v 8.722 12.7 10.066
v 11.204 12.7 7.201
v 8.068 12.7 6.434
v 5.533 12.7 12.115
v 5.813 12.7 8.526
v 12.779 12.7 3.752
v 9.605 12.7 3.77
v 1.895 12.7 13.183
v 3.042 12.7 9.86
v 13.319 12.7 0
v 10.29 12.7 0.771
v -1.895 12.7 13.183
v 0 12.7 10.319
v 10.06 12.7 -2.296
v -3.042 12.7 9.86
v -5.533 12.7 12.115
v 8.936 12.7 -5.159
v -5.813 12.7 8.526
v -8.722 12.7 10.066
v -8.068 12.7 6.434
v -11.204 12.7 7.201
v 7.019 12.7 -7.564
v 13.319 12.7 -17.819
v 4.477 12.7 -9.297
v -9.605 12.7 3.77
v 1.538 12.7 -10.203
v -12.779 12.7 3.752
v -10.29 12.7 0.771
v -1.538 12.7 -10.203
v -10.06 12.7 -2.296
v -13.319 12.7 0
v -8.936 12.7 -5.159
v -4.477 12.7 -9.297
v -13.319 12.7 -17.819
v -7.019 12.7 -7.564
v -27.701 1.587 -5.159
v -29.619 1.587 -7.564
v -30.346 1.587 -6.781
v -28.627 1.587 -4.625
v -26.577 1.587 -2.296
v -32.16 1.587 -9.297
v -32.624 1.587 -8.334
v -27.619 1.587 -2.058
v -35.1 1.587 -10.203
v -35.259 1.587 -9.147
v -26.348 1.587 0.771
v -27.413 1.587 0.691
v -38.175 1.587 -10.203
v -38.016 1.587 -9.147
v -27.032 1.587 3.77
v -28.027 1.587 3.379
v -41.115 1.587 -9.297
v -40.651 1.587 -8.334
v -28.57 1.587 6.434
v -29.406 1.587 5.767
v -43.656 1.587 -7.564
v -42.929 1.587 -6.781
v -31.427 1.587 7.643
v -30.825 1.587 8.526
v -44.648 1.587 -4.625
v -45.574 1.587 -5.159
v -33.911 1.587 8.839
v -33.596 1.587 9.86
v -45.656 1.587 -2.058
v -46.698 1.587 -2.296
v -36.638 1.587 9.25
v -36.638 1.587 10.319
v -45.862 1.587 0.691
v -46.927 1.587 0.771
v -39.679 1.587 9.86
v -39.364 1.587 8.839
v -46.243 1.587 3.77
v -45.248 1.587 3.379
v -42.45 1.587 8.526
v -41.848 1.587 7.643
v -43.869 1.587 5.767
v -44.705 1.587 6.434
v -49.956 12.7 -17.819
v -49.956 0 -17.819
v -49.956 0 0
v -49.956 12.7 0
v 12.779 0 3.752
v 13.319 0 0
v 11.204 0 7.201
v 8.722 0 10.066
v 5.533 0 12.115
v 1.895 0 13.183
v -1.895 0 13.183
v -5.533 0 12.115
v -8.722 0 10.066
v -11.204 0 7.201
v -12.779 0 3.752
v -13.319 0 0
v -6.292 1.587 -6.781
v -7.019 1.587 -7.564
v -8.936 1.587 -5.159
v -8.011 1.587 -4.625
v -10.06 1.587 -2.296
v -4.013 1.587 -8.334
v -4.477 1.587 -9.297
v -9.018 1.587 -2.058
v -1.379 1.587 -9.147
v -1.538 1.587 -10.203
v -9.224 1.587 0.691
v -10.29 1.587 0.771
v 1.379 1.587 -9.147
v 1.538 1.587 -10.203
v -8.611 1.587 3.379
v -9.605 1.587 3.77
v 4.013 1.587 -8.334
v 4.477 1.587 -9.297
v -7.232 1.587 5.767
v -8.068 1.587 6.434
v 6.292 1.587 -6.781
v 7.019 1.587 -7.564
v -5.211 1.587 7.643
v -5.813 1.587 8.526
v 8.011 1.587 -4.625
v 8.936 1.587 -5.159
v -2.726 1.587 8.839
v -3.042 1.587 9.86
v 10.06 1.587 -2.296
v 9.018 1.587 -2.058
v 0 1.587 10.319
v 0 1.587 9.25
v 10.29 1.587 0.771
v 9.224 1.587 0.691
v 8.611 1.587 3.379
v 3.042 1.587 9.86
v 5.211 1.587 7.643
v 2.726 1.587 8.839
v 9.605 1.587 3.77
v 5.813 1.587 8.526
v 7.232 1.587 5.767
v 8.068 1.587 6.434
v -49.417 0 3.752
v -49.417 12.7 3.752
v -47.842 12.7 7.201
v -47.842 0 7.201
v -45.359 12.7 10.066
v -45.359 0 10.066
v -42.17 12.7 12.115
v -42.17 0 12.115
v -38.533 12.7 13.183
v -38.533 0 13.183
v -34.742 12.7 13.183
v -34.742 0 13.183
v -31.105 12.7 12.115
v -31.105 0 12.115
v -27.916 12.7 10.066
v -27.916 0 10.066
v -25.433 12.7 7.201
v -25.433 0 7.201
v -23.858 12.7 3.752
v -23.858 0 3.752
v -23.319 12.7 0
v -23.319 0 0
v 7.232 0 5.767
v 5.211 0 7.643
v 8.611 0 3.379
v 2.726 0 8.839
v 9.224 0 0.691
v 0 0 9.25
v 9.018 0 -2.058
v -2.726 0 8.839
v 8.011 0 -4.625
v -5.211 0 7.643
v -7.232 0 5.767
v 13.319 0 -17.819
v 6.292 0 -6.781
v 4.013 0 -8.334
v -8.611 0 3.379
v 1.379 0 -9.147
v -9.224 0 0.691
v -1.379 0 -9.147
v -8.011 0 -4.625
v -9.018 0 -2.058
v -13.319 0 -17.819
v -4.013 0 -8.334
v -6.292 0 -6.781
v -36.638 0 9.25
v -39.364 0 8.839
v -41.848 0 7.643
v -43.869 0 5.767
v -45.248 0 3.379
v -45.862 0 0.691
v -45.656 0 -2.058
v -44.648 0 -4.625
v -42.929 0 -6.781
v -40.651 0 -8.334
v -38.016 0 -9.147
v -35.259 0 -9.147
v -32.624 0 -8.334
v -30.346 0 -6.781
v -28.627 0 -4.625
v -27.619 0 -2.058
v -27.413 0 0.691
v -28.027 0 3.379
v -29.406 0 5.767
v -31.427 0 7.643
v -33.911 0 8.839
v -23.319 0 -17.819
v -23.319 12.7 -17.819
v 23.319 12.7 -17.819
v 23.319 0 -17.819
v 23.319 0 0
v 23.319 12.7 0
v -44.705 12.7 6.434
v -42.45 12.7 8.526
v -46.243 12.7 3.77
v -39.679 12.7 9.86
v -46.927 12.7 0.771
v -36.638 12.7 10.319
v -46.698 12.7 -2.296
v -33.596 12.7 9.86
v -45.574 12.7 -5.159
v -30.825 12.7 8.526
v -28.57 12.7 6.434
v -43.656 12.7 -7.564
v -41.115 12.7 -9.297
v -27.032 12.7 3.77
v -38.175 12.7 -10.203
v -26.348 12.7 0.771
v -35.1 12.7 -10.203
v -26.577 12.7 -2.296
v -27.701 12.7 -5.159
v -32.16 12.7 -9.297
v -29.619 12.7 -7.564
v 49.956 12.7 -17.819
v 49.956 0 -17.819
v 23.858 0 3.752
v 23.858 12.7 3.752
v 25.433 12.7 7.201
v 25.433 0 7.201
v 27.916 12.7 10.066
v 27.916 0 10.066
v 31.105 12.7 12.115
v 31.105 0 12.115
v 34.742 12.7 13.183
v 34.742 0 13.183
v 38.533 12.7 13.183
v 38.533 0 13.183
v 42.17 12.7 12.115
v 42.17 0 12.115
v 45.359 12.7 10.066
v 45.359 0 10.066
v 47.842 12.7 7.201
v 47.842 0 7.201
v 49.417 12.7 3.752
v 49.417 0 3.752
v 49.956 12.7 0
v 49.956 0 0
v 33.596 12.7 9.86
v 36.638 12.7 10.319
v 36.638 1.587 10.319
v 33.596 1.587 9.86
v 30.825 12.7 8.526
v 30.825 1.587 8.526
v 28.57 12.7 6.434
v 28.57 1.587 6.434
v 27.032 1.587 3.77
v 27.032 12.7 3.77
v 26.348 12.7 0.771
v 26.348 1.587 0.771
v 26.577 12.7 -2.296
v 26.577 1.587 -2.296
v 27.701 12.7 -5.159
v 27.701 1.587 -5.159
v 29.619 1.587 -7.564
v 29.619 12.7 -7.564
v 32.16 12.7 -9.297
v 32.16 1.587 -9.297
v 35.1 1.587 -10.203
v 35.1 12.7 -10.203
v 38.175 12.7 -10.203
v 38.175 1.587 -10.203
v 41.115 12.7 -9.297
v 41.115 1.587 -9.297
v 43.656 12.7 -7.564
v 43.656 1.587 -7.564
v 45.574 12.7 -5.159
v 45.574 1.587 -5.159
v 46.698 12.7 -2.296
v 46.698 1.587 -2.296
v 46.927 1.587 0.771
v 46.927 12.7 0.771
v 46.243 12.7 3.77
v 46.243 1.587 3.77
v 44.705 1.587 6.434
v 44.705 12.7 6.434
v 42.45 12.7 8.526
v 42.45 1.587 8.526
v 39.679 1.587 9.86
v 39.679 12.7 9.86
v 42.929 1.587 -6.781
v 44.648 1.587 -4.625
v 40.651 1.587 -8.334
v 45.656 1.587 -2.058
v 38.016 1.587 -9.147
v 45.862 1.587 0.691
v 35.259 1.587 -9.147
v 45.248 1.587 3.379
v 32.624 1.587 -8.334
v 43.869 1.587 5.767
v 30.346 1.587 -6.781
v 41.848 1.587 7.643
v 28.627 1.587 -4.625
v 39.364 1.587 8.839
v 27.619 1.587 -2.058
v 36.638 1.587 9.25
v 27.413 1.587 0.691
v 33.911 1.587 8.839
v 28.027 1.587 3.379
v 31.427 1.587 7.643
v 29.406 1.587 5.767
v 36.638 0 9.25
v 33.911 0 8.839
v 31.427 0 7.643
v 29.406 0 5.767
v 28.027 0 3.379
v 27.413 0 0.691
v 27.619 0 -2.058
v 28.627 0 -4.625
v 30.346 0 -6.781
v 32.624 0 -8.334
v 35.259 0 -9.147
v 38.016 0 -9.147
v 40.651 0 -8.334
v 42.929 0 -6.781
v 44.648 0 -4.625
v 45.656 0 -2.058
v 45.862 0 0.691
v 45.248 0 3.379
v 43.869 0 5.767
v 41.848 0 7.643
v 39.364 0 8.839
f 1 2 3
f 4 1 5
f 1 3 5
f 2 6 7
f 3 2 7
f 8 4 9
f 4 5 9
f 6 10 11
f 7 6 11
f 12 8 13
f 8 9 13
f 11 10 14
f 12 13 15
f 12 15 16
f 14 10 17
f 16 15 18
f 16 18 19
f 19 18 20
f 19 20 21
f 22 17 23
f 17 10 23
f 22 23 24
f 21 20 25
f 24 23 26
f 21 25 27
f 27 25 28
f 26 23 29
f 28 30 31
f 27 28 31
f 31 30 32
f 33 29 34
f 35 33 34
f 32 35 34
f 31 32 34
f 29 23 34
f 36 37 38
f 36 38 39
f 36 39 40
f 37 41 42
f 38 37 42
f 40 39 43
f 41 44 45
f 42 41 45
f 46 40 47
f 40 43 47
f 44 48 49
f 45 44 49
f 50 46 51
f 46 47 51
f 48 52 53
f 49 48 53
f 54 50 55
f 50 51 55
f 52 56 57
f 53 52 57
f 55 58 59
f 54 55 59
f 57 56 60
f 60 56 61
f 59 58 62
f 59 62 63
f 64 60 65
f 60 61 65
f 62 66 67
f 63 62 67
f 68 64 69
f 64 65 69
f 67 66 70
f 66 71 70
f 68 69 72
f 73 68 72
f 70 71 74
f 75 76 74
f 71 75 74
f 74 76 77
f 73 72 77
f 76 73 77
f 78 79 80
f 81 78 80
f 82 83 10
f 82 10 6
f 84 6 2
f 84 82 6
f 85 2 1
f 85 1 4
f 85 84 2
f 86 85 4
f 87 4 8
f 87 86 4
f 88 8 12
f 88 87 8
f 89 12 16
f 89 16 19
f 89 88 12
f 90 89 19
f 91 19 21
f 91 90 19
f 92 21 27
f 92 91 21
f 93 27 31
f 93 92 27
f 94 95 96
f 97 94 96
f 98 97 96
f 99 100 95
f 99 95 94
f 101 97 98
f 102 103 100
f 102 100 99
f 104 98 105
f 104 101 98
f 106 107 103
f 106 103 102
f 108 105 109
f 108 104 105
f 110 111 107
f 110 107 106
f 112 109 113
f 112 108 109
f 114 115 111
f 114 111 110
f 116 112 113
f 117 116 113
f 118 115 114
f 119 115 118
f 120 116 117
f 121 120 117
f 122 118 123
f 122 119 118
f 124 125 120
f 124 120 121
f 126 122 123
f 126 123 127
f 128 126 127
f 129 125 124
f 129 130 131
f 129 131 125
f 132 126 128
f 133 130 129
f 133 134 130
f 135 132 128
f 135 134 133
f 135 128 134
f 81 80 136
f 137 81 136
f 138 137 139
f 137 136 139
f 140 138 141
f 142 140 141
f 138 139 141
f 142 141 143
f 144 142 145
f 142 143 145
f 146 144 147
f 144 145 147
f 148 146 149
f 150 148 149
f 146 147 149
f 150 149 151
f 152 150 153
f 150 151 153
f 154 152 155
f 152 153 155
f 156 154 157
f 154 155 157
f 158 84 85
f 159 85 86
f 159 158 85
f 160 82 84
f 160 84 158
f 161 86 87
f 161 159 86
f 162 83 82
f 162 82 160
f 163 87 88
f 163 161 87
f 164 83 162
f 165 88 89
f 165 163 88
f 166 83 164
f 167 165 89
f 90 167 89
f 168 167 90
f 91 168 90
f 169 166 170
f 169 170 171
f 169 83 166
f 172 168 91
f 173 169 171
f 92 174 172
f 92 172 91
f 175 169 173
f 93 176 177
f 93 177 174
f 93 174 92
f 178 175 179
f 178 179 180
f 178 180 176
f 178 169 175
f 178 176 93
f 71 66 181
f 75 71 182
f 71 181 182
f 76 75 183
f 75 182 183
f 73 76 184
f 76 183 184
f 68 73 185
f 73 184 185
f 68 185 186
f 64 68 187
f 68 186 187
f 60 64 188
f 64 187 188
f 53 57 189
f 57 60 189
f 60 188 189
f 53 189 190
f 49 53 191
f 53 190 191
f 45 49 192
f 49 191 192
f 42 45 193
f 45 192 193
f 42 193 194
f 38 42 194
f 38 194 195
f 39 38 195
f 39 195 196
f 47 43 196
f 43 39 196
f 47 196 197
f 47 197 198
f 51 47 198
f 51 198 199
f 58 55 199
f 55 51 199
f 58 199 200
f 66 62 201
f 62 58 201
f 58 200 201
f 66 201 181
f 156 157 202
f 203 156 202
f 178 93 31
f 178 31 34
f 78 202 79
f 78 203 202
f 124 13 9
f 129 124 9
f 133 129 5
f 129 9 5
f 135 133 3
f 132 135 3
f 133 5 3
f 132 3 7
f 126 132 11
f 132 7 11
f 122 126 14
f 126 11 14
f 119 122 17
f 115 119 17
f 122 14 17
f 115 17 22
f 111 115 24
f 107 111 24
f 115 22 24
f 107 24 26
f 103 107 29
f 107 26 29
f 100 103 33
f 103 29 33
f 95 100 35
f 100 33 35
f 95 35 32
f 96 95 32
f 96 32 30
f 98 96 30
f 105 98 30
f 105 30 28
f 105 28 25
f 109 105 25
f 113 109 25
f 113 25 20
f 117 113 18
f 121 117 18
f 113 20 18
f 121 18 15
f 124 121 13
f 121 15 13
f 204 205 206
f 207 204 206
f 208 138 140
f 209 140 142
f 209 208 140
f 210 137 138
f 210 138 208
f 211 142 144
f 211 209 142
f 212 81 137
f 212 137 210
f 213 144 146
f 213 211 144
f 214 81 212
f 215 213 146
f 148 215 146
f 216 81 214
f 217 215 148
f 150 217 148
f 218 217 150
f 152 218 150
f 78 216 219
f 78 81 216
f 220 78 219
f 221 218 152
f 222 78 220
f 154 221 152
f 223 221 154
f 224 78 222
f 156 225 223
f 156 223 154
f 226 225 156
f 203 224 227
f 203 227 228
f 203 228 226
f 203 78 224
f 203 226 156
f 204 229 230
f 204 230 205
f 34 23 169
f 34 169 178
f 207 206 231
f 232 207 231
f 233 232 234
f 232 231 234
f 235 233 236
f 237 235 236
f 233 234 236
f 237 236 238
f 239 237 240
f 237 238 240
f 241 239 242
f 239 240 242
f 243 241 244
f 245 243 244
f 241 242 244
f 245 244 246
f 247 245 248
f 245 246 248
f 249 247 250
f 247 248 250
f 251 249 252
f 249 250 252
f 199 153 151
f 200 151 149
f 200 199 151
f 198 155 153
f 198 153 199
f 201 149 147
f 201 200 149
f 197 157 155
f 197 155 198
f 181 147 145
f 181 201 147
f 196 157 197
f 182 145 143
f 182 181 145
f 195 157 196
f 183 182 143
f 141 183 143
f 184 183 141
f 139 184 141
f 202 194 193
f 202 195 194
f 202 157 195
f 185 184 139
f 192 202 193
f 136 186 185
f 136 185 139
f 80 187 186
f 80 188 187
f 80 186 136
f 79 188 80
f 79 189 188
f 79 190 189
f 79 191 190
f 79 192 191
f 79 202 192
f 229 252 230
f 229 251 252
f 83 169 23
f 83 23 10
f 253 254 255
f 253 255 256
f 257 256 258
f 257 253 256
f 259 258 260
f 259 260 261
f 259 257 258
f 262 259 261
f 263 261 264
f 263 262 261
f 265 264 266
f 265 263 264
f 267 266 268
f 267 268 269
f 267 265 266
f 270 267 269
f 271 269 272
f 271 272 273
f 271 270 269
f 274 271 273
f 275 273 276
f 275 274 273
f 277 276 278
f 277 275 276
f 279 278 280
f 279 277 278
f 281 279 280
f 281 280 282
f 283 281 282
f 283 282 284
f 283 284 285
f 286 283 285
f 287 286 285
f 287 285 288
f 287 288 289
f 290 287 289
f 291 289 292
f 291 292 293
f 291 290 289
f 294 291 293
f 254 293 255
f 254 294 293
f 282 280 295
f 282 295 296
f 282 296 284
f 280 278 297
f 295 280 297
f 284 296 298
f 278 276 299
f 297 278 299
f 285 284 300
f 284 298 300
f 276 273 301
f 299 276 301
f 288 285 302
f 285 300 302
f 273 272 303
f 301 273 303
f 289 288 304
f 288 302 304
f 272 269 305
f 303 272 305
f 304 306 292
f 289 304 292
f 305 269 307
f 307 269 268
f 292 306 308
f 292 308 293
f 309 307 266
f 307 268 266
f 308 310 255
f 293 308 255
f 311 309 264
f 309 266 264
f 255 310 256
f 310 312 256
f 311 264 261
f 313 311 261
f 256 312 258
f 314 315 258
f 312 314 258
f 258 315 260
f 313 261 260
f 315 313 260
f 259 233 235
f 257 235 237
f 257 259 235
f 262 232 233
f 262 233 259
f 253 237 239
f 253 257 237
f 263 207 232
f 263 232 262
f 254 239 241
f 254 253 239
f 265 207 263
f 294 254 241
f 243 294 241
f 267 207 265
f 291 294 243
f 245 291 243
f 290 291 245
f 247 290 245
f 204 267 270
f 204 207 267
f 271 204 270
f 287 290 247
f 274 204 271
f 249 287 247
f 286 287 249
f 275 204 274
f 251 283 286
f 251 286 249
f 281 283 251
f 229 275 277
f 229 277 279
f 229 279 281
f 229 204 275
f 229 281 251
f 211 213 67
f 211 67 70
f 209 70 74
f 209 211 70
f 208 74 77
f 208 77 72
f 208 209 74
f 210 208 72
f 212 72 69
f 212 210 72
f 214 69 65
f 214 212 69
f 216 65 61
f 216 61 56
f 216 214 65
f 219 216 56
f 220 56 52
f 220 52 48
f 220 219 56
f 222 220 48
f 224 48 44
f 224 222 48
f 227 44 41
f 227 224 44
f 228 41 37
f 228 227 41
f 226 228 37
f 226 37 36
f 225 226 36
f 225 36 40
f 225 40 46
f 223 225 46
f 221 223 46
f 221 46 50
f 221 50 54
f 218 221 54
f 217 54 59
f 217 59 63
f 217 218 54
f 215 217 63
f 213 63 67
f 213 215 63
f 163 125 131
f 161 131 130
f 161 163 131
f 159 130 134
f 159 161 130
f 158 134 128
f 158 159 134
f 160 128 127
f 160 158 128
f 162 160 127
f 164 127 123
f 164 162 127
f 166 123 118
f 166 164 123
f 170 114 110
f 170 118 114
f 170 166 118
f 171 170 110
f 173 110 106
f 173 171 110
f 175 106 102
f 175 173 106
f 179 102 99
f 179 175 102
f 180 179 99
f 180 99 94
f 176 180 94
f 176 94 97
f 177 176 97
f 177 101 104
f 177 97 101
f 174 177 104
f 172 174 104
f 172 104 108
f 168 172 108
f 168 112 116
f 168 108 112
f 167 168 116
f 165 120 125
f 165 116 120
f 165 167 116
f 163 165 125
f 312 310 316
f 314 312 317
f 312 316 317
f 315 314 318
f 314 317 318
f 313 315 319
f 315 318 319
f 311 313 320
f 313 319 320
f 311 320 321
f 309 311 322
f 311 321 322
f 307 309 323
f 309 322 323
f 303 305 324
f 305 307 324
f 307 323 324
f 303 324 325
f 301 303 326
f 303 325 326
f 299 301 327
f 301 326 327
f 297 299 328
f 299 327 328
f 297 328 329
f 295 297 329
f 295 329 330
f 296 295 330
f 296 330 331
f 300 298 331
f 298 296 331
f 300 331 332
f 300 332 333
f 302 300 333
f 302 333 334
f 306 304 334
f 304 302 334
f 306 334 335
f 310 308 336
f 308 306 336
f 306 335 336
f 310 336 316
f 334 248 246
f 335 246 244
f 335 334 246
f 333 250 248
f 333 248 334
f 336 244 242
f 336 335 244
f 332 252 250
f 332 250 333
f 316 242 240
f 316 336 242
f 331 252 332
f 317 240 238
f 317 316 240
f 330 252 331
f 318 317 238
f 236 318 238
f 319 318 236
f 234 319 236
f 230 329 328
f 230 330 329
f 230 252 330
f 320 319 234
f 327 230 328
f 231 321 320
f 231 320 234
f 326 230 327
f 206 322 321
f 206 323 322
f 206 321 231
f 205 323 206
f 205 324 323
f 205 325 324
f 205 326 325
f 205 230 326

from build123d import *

# Parameters (mm, degrees)
SKETCH1_R           = 9.25
BOSS_EXTRUDE1_DEPTH = 12.7
SKETCH2_R           = 10.31875
CUT_EXTRUDE1_DEPTH  = 11.1125
BOSS_EXTRUDE2_DEPTH = 40
SKETCH4_W           = 59.346430133
SKETCH4_H           = 21.496595804
CUT_EXTRUDE2_DEPTH  = 45
SKETCH5_W           = 104.9125
SKETCH5_H           = 1.478286878
CUT_EXTRUDE3_DEPTH  = 45


with BuildPart() as part:
    # Sketch1 → Boss-Extrude1 (new body)
    with BuildSketch(Plane(origin=(0, 0, 0), x_dir=(1, 0, 0), z_dir=(0, 1, 0))):
        with BuildLine():
            Line((-13.31875, 0), (-13.31875, 13.31875))
            Line((-13.31875, 13.31875), (-13.31875, 17.81875))
            Line((-13.31875, 17.81875), (13.31875, 17.81875))
            Line((13.31875, 17.81875), (13.31875, 13.31875))
            Line((13.31875, 13.31875), (13.31875, 0))
            ThreePointArc((13.31875, 0), (0, -13.31875), (-13.31875, 0))
        make_face()
        with Locations(Location((0, 0, 0), (0, 0, 270))):
            Circle(SKETCH1_R, mode=Mode.SUBTRACT)
    extrude(amount=BOSS_EXTRUDE1_DEPTH)

    # Sketch2 → Cut-Extrude1 (cut)
    with BuildSketch(Plane(origin=(0, 12.7, 0), x_dir=(1, 0, 0), z_dir=(0, 1, 0))):
        with Locations(Location((0, 0, 0), (0, 0, 270))):
            Circle(SKETCH2_R)
    extrude(amount=-CUT_EXTRUDE1_DEPTH, mode=Mode.SUBTRACT)

    # Sketch3 → Boss-Extrude2 (add)
    with BuildSketch(Plane(origin=(0, 0, -17.81875), x_dir=(-1, 0, 0), z_dir=(0, 0, -1))):
        Polygon((0, 0), (-18.31875, 0), (-18.31875, -1.478286878), (18.31875, -1.478286878), (18.31875, 0), align=None)
    extrude(amount=-BOSS_EXTRUDE2_DEPTH)

    # Mirror2: part across plane


with BuildPart() as part_1:
    add(part.part)
    add(part.part.mirror(Plane.ZY.offset(18.31875)))

    # Mirror4: part across plane


with BuildPart() as part_2:
    add(part_1.part)
    add(part_1.part.mirror(Plane(origin=(18.31875, 0, 0), x_dir=(0, 0, 1), z_dir=(1, 0, 0))))

    # Sketch4 → Cut-Extrude2 (cut)
    with BuildSketch(Plane(origin=(49.95625, 0, 0), x_dir=(0, 0, -1), z_dir=(1, 0, 0))):
        with Locations((2.088766469, 4.510636286)):
            Rectangle(SKETCH4_W, SKETCH4_H)
    extrude(amount=CUT_EXTRUDE2_DEPTH, mode=Mode.SUBTRACT)

    # Sketch5 → Cut-Extrude3 (cut)
    with BuildSketch(Plane(origin=(0, 0, -17.81875), x_dir=(-1, 0, 0), z_dir=(0, 0, -1))):
        with Locations((2.5, -0.739143439)):
            Rectangle(SKETCH5_W, SKETCH5_H)
    extrude(amount=-CUT_EXTRUDE3_DEPTH, mode=Mode.SUBTRACT)


with BuildPart() as cut_extrude3_piece_1:
    # of the separate pieces the step leaves, piece 1, a body of its own (cut_extrude3_pieces)
    add(part_2.part.solids().sort_by_distance((13.31875, 0, -17.81875))[0])


with BuildPart() as cut_extrude3_piece_2:
    # of the separate pieces the step leaves, piece 2, a body of its own (cut_extrude3_pieces)
    add(part_2.part.solids().sort_by_distance((23.31875, 0, -17.81875))[0])


with BuildPart() as cut_extrude3_piece_3:
    # of the separate pieces the step leaves, piece 3, a body of its own (cut_extrude3_pieces)
    add(part_2.part.solids().sort_by_distance((-49.95625, 0, -17.81875))[0])


solid = Compound([cut_extrude3_piece_1.part, cut_extrude3_piece_2.part, cut_extrude3_piece_3.part])
